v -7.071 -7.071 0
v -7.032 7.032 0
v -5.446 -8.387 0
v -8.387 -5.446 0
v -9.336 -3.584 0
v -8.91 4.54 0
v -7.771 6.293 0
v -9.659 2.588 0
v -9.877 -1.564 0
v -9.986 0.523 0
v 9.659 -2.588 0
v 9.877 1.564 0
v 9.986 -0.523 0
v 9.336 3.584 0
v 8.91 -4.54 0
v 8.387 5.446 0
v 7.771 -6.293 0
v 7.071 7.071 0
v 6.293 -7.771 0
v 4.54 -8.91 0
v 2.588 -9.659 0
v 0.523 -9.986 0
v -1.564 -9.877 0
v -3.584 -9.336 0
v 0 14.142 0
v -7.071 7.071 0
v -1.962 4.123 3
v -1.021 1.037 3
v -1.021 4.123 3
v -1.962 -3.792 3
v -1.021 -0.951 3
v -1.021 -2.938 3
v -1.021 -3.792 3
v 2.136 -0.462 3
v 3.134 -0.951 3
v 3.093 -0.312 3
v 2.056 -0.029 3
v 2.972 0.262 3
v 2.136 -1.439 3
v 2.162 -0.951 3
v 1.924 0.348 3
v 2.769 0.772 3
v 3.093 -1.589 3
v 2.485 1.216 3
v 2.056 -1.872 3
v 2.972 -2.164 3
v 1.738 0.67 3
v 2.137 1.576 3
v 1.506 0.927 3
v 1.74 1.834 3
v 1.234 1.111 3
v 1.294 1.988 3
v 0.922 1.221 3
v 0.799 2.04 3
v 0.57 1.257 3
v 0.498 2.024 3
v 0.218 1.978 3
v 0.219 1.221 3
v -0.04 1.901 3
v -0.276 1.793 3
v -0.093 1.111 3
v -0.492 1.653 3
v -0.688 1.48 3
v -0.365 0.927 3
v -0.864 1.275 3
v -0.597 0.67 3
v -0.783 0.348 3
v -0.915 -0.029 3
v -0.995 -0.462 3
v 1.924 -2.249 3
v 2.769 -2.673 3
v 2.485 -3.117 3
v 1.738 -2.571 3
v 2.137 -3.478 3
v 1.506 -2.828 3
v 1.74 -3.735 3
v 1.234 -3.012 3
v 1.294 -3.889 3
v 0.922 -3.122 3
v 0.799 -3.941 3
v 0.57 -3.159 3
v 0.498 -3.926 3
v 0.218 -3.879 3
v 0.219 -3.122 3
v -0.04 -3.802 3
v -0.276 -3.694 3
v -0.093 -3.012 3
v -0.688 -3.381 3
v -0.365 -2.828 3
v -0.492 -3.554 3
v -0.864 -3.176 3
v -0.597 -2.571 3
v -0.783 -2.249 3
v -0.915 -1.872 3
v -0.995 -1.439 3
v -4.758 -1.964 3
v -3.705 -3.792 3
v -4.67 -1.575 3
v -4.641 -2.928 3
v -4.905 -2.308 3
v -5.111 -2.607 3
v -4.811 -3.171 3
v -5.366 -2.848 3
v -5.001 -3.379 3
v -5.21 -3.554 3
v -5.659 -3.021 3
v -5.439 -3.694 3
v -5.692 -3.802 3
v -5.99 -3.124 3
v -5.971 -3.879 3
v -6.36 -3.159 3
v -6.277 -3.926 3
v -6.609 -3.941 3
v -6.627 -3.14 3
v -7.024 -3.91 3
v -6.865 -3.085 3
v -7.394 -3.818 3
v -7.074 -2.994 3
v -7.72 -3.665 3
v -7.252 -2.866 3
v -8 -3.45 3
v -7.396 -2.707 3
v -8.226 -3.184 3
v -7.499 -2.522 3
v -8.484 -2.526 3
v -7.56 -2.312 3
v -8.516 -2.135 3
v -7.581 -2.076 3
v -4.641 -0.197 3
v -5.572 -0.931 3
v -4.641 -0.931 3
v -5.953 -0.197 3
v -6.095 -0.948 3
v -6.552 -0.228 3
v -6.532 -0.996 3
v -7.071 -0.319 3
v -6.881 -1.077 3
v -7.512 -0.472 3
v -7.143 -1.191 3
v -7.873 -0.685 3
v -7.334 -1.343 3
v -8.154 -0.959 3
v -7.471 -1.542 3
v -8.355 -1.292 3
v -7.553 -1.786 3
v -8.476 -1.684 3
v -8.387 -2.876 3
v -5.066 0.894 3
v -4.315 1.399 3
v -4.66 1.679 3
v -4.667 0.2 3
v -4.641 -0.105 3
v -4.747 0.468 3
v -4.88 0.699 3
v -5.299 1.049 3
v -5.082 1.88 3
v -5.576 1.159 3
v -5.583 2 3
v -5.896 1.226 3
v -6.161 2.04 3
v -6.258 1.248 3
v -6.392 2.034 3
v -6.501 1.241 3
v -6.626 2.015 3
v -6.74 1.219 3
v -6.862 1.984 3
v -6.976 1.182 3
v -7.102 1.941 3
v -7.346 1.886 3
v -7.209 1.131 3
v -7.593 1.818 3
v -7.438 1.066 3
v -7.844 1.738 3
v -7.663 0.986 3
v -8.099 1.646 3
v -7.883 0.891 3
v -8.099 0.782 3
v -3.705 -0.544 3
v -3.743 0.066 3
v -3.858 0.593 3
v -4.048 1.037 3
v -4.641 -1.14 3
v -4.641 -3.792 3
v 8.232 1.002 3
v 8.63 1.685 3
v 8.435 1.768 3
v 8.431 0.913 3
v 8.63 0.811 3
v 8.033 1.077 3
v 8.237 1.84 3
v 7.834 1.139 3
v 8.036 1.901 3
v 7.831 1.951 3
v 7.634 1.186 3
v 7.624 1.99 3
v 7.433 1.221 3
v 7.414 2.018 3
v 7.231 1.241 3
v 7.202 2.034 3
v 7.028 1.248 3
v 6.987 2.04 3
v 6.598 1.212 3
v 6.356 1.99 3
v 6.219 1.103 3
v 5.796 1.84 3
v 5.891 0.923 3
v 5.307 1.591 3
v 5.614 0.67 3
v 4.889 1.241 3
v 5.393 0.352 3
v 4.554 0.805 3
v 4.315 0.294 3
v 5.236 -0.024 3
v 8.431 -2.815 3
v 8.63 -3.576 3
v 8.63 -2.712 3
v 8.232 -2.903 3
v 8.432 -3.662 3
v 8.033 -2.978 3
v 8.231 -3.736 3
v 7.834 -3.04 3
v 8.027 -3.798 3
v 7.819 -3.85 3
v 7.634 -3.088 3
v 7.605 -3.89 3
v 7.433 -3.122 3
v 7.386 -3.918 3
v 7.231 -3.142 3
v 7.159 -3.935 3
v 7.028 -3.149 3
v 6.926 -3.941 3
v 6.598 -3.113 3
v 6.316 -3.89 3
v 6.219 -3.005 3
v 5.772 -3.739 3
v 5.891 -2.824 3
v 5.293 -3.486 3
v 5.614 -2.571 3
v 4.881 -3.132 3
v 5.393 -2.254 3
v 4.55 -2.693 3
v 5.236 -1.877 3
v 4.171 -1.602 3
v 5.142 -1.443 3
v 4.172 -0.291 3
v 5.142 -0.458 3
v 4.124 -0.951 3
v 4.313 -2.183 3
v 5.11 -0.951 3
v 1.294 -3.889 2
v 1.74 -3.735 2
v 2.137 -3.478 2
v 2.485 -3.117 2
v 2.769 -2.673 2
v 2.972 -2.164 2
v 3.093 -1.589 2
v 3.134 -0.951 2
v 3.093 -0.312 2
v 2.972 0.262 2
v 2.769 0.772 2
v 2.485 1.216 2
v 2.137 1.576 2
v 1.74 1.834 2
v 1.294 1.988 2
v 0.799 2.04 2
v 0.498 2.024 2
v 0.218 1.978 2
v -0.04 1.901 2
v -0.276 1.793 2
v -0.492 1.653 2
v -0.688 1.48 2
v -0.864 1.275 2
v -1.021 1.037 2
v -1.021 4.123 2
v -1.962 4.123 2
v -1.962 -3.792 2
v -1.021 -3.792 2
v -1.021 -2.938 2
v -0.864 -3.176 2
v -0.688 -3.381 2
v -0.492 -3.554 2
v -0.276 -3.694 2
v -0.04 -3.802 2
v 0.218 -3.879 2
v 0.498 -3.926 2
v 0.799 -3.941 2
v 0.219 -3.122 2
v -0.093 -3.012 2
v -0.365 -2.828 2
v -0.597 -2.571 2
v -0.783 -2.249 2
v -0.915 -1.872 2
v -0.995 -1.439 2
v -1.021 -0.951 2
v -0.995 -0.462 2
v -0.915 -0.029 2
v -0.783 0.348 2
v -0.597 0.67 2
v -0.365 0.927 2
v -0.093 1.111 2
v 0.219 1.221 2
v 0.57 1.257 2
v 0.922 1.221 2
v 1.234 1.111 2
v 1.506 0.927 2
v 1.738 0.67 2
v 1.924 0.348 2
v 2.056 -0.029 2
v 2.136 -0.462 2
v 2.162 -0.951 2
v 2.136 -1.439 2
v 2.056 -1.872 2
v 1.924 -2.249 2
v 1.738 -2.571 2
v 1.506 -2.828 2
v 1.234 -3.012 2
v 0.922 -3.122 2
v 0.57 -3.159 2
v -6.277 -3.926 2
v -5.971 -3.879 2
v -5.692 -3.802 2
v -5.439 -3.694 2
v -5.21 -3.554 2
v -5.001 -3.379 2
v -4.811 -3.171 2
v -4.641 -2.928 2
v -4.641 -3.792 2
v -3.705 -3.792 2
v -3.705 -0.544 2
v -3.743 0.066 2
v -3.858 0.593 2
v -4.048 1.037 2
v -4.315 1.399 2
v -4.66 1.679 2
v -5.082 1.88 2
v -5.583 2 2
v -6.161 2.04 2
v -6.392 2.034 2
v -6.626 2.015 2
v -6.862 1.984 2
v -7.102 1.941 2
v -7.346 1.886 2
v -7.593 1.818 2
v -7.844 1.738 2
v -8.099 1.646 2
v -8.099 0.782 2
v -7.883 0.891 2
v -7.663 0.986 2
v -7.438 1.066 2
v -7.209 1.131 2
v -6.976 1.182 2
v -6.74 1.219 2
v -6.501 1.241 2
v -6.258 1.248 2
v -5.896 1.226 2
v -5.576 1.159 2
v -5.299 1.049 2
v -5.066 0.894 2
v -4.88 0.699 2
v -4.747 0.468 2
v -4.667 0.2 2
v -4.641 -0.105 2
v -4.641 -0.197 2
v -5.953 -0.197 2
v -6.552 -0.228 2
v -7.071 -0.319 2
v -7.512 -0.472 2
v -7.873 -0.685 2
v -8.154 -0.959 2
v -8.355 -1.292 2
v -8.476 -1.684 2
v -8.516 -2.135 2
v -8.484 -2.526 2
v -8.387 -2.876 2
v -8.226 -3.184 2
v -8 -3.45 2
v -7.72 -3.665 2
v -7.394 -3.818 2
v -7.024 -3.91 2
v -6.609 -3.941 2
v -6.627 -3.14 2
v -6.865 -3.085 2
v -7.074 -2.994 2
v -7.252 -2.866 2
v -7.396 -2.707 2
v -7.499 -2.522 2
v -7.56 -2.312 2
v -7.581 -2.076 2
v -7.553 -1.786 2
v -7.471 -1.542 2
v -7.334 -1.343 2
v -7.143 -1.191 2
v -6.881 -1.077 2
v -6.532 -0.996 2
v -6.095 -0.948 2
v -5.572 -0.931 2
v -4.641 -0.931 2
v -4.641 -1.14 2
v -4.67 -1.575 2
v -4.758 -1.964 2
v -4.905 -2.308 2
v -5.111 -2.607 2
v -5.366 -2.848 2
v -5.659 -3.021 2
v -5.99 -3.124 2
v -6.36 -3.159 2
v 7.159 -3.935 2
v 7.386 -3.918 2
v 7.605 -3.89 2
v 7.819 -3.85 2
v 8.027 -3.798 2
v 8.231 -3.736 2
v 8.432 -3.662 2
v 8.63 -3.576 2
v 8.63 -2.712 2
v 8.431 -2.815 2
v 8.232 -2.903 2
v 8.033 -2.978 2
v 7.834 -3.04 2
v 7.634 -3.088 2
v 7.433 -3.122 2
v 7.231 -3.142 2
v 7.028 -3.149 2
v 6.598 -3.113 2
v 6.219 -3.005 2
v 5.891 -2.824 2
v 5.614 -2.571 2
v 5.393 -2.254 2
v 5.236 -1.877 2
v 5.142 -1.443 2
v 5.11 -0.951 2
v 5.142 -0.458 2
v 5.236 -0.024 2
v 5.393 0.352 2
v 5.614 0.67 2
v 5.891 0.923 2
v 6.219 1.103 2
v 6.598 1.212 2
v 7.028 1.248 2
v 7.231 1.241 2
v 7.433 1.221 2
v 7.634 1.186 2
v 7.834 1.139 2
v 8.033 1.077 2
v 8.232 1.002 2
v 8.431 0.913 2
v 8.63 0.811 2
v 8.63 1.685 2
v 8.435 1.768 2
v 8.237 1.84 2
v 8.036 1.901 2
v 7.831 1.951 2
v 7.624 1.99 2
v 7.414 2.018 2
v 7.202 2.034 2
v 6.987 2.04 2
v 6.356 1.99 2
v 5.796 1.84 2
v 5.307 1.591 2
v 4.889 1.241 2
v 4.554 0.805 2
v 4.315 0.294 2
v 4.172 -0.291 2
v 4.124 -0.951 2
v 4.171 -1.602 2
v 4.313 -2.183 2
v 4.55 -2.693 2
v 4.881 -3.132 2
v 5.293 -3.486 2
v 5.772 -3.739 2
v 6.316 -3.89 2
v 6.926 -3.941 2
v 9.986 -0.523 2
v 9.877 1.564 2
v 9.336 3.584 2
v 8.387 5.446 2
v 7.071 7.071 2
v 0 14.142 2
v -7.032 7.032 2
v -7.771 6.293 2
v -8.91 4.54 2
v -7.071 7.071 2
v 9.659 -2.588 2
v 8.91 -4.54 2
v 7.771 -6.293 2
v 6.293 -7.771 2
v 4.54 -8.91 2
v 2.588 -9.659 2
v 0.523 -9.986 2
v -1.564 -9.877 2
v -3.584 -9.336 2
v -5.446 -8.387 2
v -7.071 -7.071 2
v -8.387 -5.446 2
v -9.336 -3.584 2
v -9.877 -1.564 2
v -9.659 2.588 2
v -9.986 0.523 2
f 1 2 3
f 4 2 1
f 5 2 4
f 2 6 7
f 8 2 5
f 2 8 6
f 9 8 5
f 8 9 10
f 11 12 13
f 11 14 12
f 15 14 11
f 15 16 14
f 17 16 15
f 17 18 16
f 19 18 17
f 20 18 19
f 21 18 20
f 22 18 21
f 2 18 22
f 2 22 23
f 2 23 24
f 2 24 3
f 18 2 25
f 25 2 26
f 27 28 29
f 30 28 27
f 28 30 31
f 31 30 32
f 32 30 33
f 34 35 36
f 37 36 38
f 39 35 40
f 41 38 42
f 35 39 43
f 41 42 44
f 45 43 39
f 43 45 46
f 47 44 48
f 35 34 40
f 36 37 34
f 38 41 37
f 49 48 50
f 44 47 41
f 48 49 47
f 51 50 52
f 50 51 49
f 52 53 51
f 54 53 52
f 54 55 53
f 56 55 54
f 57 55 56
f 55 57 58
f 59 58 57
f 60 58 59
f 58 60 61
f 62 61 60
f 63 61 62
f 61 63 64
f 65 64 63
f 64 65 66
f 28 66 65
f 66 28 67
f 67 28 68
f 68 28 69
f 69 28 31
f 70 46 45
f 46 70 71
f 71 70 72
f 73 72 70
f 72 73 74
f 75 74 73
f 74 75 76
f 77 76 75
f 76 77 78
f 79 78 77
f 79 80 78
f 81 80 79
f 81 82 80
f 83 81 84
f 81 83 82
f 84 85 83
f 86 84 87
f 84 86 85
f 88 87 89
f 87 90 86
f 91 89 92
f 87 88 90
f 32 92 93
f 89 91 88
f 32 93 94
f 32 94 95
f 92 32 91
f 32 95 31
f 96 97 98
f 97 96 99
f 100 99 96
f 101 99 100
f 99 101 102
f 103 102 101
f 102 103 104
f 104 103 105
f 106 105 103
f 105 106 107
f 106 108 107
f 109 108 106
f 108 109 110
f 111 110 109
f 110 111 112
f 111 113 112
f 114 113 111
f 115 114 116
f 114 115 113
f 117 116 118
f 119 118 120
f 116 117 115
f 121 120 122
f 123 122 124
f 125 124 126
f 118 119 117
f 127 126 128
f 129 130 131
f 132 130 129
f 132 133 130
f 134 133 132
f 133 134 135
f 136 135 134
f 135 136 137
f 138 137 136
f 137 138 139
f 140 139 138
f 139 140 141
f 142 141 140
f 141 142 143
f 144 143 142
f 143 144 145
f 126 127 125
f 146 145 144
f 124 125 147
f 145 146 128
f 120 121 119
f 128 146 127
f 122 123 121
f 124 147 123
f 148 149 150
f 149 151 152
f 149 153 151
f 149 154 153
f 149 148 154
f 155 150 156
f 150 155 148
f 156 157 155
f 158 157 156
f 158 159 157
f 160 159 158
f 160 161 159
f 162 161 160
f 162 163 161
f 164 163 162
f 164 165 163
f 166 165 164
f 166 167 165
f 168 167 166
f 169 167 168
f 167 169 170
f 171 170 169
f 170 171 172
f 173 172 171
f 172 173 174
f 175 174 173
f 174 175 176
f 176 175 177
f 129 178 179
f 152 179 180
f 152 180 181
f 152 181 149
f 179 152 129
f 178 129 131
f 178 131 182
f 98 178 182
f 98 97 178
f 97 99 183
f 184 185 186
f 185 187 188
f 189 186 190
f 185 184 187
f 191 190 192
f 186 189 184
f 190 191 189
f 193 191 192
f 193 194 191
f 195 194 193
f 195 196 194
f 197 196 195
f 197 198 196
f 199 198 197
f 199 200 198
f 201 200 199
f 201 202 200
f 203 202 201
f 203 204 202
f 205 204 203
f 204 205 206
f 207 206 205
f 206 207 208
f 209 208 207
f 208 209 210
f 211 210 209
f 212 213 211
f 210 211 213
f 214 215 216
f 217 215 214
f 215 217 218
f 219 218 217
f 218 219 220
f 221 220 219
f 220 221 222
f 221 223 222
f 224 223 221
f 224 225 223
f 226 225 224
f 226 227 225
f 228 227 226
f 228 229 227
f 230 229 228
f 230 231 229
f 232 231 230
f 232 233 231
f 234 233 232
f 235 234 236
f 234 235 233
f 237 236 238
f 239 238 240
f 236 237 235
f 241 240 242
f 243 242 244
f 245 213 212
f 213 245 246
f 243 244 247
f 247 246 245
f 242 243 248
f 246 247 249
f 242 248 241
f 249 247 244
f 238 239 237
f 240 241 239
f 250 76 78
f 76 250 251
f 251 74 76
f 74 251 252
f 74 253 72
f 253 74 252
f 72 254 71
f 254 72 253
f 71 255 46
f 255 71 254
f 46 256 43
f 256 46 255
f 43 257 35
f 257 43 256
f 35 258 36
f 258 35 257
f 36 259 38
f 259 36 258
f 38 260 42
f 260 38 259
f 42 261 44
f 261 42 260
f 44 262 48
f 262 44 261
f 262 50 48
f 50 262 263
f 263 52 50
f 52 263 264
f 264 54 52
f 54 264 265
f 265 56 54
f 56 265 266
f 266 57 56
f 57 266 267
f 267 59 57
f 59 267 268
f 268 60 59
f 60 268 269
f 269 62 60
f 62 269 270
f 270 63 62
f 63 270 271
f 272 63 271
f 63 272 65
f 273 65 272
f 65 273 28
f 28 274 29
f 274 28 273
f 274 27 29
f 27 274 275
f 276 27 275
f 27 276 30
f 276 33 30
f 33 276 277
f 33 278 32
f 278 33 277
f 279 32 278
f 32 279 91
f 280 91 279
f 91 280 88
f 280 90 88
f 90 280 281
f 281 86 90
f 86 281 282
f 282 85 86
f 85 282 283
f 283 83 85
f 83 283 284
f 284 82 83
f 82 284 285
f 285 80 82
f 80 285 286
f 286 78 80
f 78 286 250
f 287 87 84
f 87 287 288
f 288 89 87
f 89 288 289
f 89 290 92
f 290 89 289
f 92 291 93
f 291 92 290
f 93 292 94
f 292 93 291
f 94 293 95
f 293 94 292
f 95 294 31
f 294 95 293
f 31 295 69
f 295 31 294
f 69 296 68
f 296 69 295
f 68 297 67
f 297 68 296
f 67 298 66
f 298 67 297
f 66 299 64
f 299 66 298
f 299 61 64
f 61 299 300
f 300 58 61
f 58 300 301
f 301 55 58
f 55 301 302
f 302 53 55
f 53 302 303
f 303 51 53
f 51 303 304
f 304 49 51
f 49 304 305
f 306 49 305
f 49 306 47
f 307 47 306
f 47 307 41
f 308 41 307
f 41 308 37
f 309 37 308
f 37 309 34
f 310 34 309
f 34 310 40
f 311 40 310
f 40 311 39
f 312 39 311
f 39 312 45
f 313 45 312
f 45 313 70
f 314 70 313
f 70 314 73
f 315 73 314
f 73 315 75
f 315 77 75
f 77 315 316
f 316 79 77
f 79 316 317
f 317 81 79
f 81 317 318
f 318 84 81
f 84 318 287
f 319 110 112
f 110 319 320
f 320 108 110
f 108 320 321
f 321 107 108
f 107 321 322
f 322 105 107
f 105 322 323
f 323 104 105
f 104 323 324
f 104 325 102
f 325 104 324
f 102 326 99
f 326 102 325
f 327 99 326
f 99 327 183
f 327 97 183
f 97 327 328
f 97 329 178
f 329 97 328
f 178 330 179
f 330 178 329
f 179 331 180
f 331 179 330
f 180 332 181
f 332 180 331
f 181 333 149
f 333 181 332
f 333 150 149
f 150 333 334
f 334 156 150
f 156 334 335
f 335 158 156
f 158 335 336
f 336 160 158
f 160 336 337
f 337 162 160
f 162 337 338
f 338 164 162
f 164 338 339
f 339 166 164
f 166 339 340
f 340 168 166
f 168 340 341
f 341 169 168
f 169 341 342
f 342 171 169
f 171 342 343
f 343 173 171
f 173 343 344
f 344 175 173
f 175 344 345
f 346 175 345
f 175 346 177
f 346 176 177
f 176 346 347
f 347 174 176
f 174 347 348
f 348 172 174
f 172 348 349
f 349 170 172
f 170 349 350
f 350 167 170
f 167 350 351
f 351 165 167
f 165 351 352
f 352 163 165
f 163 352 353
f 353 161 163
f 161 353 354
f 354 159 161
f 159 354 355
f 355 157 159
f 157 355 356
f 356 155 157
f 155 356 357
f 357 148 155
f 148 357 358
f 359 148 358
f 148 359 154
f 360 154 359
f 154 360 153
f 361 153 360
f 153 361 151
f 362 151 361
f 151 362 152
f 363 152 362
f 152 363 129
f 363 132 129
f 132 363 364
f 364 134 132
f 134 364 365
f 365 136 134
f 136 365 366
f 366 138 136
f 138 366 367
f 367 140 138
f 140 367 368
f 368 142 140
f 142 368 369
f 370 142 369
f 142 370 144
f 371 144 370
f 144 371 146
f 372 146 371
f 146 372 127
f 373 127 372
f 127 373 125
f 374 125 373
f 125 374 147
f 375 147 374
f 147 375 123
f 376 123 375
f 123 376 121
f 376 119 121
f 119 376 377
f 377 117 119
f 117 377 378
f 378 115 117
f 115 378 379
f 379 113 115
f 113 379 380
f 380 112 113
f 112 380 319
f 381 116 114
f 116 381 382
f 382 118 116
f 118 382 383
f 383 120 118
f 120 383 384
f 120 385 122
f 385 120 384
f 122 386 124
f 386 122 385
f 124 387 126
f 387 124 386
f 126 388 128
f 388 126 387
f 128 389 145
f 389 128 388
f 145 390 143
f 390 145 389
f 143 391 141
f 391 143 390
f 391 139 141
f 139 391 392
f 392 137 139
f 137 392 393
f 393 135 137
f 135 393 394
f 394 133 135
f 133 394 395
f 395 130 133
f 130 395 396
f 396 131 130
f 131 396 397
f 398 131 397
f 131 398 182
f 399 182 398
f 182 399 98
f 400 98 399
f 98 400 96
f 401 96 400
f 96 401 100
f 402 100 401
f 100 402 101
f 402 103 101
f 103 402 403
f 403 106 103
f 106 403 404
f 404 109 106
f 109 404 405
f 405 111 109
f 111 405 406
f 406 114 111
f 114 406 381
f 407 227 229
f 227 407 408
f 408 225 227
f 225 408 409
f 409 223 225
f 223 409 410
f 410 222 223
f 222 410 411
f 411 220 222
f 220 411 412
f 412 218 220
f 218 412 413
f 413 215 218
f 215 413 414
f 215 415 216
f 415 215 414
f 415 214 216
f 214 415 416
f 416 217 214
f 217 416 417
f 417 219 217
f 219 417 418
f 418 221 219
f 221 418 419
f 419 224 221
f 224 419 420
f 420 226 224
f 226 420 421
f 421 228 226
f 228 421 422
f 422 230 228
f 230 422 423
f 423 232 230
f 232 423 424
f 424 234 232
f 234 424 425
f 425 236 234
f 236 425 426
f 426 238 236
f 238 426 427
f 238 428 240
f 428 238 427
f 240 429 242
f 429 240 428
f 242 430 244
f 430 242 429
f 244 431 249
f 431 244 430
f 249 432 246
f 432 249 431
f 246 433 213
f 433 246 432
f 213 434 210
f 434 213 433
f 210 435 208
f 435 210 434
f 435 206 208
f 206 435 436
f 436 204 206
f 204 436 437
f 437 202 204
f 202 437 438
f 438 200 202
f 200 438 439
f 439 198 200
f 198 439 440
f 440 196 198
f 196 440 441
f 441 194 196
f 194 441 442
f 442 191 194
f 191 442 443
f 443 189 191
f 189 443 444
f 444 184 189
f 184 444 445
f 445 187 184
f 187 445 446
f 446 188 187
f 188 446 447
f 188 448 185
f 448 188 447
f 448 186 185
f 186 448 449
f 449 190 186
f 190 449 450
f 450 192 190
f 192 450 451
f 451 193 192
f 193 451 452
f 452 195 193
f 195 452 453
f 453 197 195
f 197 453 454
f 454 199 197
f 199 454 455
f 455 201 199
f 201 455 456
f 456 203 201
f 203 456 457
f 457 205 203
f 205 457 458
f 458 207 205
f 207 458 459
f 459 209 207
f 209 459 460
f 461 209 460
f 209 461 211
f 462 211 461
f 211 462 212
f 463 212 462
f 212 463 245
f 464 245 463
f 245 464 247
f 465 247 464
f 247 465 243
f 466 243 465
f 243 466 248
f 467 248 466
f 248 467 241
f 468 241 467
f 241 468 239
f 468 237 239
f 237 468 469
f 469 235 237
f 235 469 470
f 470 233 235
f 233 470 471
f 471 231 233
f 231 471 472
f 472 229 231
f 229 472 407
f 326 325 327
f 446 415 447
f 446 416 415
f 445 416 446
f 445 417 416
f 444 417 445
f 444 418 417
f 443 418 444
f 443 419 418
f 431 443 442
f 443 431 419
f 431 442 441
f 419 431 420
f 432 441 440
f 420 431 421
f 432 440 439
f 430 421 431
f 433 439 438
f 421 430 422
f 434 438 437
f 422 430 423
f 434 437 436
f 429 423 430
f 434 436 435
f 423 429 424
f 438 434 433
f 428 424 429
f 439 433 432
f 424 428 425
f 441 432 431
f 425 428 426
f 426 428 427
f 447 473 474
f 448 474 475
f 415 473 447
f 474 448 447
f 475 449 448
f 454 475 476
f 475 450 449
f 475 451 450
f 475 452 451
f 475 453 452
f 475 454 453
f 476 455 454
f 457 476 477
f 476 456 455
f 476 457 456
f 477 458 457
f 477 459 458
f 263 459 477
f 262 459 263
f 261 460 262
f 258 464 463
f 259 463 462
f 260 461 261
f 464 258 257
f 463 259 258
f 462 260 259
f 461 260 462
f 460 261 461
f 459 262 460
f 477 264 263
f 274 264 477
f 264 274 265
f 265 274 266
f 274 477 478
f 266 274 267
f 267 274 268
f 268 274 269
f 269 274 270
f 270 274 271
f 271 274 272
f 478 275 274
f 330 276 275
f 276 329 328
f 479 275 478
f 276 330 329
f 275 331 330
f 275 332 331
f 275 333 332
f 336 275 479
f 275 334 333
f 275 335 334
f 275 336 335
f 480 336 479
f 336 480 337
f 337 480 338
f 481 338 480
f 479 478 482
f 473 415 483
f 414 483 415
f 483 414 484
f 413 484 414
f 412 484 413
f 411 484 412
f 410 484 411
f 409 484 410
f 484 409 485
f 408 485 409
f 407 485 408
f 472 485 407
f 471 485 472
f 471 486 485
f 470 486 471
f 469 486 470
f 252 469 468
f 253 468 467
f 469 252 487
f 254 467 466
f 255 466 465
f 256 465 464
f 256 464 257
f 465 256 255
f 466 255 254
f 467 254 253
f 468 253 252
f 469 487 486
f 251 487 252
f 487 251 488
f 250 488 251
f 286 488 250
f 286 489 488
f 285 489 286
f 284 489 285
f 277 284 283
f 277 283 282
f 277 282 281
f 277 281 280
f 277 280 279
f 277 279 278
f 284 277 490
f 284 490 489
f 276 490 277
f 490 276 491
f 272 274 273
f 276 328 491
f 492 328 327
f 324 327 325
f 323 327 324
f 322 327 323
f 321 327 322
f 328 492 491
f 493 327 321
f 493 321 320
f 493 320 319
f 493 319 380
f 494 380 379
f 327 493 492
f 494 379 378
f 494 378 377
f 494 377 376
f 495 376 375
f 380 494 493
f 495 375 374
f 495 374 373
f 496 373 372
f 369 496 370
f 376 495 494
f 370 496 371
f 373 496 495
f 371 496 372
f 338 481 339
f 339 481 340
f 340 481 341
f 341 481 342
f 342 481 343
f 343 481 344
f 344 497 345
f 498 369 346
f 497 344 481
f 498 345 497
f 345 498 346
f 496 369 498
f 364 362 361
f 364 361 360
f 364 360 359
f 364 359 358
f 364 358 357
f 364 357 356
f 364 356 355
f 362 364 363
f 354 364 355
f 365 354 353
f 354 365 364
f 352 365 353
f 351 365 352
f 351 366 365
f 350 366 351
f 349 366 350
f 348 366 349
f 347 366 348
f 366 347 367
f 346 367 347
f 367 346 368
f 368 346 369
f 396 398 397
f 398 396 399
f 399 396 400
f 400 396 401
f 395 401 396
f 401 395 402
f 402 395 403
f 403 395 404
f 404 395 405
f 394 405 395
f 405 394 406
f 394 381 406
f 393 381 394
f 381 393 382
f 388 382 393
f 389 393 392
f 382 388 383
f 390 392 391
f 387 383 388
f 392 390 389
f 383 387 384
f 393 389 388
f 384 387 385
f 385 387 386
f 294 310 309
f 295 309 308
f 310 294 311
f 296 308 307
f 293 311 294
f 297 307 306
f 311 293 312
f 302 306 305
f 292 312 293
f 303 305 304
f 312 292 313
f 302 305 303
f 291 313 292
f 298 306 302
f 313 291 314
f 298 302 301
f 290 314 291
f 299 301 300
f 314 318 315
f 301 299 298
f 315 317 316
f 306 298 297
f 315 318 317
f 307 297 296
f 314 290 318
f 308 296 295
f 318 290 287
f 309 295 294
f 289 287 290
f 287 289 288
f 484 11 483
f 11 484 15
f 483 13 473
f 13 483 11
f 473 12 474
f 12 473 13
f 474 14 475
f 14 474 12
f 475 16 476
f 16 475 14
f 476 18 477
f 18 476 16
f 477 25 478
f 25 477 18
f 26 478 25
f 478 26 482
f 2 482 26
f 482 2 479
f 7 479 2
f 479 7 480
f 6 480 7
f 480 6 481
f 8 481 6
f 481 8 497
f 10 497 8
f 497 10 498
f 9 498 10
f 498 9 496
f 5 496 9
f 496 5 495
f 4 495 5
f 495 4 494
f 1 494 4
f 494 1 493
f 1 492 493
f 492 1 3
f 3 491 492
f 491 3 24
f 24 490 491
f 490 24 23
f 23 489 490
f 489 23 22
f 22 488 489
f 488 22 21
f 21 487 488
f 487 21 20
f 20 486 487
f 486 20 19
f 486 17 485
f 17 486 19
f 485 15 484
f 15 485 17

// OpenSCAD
//height of the font in mm
Font_height = 1;
//size of the word in mm
font_size = 10;
//word
text = "abc";
//Thickness of the drop in mm
Drop_thickness = 2;
//size of the diameter of the drop in mm
size = 10;
union(){
  // size is multiplied by 0.75 because openScad font sizes are in points, not pixels
  linear_extrude( height=(Drop_thickness + Font_height), twist=0, center=false){
    text(str(text), font = "Roboto", size = font_size*0.75, halign="center", valign="center");
  }

  rotate([0, 0, 45]){
    linear_extrude( height=2, twist=0, scale=[1, 1], center=false){
      union(){
        circle(r=size);
        square([size, size], center=false);
      }
    }
  }
}
